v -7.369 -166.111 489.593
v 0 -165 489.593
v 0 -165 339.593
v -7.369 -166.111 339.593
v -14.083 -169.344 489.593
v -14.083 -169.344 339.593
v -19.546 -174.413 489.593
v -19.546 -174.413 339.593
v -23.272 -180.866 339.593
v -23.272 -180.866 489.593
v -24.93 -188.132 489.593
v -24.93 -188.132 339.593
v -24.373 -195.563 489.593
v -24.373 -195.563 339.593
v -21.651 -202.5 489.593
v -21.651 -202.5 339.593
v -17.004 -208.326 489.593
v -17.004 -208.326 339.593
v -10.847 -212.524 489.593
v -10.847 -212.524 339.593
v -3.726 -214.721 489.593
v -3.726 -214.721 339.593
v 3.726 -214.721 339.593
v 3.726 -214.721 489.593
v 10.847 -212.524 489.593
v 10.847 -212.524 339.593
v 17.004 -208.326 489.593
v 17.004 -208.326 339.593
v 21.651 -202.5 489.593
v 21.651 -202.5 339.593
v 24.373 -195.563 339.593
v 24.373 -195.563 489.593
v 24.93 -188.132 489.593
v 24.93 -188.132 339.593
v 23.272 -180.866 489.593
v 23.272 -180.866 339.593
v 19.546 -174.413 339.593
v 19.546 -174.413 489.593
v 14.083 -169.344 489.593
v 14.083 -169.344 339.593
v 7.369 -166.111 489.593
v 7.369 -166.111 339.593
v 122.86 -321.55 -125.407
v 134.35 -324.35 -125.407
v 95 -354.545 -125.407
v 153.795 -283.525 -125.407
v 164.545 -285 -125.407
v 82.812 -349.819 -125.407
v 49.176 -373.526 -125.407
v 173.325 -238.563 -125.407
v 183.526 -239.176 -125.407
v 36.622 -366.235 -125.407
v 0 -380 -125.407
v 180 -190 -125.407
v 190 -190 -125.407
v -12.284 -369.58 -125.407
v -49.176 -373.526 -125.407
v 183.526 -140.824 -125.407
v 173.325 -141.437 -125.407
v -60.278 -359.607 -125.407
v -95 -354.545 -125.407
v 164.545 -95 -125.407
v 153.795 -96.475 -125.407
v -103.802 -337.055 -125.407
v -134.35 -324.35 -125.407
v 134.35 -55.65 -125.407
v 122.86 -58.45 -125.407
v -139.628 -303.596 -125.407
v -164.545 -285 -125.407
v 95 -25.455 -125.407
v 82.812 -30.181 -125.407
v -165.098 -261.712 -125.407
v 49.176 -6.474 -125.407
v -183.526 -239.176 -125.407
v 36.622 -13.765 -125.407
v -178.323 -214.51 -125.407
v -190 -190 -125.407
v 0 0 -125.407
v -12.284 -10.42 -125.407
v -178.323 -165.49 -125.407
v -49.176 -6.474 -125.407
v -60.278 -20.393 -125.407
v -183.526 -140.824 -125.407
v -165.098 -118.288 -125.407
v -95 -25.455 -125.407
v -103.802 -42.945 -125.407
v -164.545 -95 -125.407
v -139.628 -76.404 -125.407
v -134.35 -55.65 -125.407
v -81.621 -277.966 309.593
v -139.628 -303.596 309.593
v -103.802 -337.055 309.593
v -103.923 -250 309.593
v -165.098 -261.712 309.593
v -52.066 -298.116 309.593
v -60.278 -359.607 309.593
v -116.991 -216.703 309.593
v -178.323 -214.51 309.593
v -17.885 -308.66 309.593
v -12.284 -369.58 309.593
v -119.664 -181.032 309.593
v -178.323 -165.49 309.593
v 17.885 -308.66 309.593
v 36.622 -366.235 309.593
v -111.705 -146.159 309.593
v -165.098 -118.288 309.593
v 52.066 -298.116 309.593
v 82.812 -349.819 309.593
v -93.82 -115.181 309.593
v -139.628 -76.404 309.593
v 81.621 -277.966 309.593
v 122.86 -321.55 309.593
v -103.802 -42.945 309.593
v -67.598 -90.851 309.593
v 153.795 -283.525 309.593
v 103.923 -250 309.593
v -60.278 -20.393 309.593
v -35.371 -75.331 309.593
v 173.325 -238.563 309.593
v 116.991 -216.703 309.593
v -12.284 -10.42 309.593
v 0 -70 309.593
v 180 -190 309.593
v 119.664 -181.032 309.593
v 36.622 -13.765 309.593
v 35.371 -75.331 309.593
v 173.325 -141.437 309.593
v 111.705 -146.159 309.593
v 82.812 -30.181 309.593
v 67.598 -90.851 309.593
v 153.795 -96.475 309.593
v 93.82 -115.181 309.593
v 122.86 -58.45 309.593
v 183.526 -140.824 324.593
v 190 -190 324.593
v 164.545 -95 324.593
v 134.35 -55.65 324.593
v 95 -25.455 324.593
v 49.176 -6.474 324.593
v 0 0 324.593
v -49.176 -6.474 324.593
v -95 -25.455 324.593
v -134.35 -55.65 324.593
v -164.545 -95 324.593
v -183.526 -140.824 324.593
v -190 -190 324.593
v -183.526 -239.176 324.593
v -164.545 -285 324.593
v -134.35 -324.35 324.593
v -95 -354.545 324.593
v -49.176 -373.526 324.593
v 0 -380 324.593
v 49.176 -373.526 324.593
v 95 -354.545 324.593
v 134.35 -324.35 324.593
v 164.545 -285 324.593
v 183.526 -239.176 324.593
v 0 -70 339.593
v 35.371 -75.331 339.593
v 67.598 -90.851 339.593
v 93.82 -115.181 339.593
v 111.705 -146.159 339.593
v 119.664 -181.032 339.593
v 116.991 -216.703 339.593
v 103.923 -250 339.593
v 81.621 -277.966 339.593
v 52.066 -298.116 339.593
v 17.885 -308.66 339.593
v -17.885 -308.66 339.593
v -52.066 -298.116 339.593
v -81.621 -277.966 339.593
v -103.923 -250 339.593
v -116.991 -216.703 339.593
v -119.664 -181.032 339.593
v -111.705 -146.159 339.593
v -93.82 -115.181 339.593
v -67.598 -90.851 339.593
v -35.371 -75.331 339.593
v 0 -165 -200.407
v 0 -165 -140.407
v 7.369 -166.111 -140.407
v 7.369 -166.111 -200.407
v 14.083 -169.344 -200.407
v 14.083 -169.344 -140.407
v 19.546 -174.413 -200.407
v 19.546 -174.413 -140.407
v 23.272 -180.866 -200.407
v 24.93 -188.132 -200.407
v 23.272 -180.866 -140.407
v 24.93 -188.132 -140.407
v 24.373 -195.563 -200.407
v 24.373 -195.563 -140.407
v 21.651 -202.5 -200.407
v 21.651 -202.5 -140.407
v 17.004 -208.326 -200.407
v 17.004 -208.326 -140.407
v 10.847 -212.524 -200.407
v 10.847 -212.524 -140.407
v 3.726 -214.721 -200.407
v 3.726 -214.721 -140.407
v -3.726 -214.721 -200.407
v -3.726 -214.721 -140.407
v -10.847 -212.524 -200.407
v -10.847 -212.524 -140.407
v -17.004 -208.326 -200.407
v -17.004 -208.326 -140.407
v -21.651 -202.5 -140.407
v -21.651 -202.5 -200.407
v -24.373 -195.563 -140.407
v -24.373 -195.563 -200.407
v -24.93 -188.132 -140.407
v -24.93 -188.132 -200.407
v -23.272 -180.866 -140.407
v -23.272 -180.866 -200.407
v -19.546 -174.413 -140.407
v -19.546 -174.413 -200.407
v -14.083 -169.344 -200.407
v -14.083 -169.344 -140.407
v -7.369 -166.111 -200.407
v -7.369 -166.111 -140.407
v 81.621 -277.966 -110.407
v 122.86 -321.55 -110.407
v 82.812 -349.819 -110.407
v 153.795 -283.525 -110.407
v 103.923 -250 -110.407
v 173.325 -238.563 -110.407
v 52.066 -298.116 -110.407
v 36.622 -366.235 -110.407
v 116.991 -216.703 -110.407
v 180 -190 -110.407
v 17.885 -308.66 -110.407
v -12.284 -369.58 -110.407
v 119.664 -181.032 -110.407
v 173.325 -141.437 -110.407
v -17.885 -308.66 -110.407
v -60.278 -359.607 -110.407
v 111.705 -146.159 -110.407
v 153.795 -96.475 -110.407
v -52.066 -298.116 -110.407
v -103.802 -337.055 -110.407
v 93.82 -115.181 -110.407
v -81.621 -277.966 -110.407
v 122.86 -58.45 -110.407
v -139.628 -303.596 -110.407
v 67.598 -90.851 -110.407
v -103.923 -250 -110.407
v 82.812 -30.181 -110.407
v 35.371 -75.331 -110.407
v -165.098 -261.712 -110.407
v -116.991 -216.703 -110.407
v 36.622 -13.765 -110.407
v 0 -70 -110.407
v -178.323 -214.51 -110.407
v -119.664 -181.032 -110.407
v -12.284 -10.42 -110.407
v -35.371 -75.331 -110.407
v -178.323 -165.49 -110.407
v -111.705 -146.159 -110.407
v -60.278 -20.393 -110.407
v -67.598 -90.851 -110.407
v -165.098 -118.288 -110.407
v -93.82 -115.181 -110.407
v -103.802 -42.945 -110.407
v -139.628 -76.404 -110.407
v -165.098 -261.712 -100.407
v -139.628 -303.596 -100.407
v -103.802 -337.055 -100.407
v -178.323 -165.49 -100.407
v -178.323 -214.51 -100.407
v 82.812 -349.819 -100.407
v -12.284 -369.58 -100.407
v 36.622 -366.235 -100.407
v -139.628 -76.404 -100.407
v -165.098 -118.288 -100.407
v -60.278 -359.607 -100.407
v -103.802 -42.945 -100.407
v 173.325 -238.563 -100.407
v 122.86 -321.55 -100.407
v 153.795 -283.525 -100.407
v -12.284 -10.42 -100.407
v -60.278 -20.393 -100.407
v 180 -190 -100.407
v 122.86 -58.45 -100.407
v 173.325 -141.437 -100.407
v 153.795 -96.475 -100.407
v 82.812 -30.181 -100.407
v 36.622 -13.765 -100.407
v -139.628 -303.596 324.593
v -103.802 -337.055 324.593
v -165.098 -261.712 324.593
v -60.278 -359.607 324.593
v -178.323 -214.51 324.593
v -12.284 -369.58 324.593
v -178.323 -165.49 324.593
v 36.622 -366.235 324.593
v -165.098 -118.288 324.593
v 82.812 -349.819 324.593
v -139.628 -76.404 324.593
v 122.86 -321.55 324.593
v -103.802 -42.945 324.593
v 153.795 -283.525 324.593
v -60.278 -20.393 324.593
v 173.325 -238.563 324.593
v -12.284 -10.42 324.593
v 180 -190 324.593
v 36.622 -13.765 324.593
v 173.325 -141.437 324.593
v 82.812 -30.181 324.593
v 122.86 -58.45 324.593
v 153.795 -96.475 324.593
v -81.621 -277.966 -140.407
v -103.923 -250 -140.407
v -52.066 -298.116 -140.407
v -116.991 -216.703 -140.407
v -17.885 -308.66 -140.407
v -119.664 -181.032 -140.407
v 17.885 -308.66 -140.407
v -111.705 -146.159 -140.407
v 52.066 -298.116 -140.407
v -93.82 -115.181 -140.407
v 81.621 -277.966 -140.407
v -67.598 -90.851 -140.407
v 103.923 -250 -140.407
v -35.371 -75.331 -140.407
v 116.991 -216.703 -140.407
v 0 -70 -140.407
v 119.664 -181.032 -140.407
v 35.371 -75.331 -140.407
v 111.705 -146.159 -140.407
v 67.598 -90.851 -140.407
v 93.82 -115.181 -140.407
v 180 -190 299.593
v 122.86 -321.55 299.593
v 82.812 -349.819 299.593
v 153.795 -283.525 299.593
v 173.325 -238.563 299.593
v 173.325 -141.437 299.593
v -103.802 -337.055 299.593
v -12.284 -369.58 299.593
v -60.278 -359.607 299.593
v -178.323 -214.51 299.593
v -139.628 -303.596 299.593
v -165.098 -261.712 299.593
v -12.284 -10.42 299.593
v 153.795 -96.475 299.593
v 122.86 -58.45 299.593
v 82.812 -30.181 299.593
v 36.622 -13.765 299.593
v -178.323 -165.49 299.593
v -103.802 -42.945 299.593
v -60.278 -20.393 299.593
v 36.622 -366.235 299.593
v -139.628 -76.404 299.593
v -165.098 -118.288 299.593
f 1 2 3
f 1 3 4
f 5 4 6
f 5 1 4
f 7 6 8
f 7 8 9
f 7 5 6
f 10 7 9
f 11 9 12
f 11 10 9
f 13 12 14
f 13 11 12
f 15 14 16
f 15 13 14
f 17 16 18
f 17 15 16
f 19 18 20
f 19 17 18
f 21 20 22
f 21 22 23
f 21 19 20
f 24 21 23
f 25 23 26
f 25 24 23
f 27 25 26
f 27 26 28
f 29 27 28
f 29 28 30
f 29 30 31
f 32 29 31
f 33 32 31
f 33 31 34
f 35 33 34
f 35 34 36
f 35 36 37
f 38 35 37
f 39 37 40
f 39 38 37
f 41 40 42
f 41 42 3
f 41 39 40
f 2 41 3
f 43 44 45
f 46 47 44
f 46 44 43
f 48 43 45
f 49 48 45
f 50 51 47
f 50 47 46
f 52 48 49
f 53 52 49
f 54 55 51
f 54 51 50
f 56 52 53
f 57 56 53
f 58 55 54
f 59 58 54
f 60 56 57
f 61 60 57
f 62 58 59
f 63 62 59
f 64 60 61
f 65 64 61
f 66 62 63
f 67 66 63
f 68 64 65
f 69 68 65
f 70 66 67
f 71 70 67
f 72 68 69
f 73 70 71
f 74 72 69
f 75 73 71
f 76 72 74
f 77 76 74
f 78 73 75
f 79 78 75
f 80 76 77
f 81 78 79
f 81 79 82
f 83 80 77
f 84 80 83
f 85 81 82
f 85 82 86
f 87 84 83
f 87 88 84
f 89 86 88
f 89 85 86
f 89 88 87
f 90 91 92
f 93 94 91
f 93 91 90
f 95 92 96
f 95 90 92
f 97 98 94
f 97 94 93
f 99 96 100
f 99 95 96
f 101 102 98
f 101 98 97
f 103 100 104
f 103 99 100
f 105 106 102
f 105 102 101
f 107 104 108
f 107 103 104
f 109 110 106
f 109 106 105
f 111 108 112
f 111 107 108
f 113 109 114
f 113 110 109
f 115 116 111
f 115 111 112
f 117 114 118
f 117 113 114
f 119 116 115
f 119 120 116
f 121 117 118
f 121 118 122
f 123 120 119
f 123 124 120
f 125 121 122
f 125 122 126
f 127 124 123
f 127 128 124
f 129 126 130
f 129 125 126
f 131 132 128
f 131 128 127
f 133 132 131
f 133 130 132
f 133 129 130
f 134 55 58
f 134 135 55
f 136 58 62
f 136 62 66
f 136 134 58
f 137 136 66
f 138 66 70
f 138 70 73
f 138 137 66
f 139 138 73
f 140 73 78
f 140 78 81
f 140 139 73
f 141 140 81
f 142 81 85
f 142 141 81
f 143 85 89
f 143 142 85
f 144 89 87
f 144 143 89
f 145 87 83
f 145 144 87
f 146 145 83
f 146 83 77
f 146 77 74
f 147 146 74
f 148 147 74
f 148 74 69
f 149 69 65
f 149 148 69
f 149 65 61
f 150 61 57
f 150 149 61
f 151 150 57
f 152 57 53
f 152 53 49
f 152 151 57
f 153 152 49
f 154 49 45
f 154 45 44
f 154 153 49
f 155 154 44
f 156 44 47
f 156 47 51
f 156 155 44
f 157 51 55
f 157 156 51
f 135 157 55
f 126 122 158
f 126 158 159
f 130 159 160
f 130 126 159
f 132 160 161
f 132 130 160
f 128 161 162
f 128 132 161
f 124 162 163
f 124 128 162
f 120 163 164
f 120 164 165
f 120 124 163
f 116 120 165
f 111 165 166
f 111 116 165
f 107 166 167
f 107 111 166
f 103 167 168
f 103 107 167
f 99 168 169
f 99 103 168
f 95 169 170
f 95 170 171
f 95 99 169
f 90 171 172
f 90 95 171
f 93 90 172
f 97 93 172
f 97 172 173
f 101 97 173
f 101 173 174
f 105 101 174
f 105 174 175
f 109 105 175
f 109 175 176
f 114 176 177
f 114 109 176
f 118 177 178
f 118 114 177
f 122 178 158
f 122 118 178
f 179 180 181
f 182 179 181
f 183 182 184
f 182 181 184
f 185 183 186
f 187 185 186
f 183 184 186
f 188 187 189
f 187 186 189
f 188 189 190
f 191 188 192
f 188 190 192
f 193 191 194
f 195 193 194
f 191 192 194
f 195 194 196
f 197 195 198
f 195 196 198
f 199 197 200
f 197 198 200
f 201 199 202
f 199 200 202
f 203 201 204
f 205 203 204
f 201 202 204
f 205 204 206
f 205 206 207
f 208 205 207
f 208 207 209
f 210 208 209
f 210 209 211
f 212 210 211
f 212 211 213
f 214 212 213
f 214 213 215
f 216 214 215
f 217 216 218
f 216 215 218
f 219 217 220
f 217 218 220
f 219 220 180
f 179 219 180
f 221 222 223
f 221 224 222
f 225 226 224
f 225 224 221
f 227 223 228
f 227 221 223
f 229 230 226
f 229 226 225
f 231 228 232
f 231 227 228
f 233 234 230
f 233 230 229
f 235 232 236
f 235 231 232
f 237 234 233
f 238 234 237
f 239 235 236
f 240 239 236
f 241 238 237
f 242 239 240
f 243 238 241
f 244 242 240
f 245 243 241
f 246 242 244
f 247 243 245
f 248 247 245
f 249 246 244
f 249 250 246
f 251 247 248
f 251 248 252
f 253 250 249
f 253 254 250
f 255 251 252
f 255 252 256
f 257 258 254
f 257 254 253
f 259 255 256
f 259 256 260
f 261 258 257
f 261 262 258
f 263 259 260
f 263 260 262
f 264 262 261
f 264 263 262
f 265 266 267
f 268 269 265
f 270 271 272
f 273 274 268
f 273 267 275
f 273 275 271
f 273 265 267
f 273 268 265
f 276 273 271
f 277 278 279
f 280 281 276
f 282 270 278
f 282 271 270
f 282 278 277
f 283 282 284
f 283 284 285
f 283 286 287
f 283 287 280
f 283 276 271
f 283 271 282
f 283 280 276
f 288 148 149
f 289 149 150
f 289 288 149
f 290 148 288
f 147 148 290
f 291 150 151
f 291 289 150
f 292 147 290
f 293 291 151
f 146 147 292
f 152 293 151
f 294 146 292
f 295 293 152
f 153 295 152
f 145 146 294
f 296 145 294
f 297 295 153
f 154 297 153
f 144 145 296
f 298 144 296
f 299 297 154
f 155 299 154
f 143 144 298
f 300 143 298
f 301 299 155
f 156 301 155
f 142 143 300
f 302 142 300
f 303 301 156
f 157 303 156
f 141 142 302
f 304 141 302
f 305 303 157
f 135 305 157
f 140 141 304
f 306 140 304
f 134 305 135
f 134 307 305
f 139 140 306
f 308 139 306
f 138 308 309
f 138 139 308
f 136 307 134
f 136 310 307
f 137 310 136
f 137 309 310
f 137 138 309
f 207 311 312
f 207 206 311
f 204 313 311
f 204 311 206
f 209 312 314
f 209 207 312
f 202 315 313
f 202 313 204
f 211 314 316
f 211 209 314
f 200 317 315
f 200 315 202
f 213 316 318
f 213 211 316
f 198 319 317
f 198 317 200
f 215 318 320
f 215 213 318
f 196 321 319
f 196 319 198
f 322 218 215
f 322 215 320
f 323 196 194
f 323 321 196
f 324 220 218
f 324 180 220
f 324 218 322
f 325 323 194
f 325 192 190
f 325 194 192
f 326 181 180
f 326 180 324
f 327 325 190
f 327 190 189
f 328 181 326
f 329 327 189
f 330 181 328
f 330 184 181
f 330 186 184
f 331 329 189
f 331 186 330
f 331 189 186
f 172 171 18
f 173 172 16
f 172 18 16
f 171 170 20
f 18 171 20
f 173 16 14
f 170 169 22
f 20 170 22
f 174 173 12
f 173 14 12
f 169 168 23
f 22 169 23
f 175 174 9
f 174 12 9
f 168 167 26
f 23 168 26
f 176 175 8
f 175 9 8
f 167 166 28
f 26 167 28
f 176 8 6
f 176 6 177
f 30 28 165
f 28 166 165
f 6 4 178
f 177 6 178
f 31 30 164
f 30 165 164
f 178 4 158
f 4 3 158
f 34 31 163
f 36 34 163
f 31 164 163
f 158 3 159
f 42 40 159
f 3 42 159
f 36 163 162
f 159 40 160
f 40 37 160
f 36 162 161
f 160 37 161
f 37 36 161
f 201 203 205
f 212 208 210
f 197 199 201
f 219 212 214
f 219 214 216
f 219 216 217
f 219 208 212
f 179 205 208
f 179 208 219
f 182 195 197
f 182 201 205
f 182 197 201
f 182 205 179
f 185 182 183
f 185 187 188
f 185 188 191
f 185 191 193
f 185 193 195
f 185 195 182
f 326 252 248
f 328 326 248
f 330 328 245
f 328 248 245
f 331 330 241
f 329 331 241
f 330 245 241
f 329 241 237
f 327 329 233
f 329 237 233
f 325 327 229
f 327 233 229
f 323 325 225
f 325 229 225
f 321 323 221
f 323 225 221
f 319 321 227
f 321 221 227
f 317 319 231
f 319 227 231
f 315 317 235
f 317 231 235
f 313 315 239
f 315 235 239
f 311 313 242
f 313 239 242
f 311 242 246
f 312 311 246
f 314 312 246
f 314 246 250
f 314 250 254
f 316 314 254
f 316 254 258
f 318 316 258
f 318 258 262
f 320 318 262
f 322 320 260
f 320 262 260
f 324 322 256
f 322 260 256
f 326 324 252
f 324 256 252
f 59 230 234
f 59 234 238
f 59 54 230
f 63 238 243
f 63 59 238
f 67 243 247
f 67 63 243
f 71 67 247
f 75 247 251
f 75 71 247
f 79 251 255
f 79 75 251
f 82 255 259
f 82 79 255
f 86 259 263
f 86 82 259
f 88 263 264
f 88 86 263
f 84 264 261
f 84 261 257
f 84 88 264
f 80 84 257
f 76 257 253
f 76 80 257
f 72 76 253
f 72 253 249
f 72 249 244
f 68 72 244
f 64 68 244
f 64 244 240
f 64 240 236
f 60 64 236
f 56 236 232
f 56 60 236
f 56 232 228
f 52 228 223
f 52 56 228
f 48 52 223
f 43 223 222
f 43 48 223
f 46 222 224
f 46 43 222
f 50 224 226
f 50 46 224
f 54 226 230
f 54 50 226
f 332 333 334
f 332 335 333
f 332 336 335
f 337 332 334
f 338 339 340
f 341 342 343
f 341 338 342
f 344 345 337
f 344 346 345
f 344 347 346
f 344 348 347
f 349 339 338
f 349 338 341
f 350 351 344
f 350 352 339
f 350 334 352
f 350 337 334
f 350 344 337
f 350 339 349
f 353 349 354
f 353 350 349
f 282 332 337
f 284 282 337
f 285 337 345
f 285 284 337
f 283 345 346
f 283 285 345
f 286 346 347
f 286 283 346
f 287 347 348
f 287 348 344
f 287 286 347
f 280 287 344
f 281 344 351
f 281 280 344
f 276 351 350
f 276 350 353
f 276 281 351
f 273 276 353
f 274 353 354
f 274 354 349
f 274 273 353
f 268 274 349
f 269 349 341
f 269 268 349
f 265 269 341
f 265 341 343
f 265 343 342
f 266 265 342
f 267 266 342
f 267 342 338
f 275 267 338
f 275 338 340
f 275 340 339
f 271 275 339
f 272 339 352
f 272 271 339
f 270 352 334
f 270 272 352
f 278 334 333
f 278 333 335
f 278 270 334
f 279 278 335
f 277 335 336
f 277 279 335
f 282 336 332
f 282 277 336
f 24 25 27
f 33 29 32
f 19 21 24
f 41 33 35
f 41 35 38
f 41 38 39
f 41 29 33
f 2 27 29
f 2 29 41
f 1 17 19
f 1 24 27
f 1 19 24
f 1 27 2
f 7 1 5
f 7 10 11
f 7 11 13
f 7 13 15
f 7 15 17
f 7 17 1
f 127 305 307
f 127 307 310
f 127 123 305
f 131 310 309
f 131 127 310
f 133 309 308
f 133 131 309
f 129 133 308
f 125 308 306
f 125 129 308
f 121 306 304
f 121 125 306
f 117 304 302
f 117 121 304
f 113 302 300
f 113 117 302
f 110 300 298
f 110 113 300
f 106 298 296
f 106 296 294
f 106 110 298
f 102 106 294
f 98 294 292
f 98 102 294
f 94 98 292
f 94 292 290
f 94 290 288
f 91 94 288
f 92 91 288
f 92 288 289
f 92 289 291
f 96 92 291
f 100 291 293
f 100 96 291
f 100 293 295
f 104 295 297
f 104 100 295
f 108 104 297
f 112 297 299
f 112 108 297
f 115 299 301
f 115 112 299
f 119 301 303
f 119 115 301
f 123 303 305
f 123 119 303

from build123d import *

# Parameters (mm, degrees)
SKETCH7_R           = 120
BOSS_EXTRUDE1_DEPTH = 30
SKETCH8_R           = 25
BOSS_EXTRUDE2_DEPTH = 60
BOSS_EXTRUDE3_START = 150
SKETCH11_R          = 25
BOSS_EXTRUDE3_DEPTH = 150


# Read off the part's stored shape, not the designer's step: Revolve-Thin1
with BuildPart() as part:
    # Revolve-Thin1 outline → Revolve-Thin1 (revolve)
    with BuildSketch(Plane.XZ.offset(190)):
        Polygon((180, 309.593023256), (0, 309.593023256), (0, 299.593023256), (180, 299.593023256), (180, -100.406976744), (0, -100.406976744), (0, -110.406976744), (180, -110.406976744), (180, -125.406976744), (190, -125.406976744), (190, 324.593023256), (180, 324.593023256), align=None)
    revolve(axis=Axis((0, -190, 0), (0, 0, 1)))

    # Sketch7 → Boss-Extrude1 (add)
    with BuildSketch(Plane(origin=(0, 0, -110.406976744), x_dir=(-1, 0, 0), z_dir=(0, 0, -1))):
        with Locations(Location((0, -190, 0), (0, 0, 90))):
            Circle(SKETCH7_R)
    boss_extrude1 = extrude(amount=BOSS_EXTRUDE1_DEPTH)

    # Mirror1: Boss-Extrude1 across plane
    add(boss_extrude1.mirror(Plane(origin=(0, 0, 99.593023256), x_dir=(1, 0, 0), z_dir=(0, 0, -1))))

    # Sketch8 → Boss-Extrude2 (add)
    with BuildSketch(Plane(origin=(0, 0, -140.406976744), x_dir=(-1, 0, 0), z_dir=(0, 0, -1))):
        with Locations(Location((0, -190, 0), (0, 0, 90))):
            Circle(SKETCH8_R)
    extrude(amount=BOSS_EXTRUDE2_DEPTH)

    # Sketch11 → Boss-Extrude3 (add)
    with BuildSketch(Plane.XY.offset(339.593023256).offset(BOSS_EXTRUDE3_START)):
        with Locations(Location((0, -190, 0), (0, 0, 90))):
            Circle(SKETCH11_R)
    extrude(amount=-BOSS_EXTRUDE3_DEPTH)


solid = part.part
